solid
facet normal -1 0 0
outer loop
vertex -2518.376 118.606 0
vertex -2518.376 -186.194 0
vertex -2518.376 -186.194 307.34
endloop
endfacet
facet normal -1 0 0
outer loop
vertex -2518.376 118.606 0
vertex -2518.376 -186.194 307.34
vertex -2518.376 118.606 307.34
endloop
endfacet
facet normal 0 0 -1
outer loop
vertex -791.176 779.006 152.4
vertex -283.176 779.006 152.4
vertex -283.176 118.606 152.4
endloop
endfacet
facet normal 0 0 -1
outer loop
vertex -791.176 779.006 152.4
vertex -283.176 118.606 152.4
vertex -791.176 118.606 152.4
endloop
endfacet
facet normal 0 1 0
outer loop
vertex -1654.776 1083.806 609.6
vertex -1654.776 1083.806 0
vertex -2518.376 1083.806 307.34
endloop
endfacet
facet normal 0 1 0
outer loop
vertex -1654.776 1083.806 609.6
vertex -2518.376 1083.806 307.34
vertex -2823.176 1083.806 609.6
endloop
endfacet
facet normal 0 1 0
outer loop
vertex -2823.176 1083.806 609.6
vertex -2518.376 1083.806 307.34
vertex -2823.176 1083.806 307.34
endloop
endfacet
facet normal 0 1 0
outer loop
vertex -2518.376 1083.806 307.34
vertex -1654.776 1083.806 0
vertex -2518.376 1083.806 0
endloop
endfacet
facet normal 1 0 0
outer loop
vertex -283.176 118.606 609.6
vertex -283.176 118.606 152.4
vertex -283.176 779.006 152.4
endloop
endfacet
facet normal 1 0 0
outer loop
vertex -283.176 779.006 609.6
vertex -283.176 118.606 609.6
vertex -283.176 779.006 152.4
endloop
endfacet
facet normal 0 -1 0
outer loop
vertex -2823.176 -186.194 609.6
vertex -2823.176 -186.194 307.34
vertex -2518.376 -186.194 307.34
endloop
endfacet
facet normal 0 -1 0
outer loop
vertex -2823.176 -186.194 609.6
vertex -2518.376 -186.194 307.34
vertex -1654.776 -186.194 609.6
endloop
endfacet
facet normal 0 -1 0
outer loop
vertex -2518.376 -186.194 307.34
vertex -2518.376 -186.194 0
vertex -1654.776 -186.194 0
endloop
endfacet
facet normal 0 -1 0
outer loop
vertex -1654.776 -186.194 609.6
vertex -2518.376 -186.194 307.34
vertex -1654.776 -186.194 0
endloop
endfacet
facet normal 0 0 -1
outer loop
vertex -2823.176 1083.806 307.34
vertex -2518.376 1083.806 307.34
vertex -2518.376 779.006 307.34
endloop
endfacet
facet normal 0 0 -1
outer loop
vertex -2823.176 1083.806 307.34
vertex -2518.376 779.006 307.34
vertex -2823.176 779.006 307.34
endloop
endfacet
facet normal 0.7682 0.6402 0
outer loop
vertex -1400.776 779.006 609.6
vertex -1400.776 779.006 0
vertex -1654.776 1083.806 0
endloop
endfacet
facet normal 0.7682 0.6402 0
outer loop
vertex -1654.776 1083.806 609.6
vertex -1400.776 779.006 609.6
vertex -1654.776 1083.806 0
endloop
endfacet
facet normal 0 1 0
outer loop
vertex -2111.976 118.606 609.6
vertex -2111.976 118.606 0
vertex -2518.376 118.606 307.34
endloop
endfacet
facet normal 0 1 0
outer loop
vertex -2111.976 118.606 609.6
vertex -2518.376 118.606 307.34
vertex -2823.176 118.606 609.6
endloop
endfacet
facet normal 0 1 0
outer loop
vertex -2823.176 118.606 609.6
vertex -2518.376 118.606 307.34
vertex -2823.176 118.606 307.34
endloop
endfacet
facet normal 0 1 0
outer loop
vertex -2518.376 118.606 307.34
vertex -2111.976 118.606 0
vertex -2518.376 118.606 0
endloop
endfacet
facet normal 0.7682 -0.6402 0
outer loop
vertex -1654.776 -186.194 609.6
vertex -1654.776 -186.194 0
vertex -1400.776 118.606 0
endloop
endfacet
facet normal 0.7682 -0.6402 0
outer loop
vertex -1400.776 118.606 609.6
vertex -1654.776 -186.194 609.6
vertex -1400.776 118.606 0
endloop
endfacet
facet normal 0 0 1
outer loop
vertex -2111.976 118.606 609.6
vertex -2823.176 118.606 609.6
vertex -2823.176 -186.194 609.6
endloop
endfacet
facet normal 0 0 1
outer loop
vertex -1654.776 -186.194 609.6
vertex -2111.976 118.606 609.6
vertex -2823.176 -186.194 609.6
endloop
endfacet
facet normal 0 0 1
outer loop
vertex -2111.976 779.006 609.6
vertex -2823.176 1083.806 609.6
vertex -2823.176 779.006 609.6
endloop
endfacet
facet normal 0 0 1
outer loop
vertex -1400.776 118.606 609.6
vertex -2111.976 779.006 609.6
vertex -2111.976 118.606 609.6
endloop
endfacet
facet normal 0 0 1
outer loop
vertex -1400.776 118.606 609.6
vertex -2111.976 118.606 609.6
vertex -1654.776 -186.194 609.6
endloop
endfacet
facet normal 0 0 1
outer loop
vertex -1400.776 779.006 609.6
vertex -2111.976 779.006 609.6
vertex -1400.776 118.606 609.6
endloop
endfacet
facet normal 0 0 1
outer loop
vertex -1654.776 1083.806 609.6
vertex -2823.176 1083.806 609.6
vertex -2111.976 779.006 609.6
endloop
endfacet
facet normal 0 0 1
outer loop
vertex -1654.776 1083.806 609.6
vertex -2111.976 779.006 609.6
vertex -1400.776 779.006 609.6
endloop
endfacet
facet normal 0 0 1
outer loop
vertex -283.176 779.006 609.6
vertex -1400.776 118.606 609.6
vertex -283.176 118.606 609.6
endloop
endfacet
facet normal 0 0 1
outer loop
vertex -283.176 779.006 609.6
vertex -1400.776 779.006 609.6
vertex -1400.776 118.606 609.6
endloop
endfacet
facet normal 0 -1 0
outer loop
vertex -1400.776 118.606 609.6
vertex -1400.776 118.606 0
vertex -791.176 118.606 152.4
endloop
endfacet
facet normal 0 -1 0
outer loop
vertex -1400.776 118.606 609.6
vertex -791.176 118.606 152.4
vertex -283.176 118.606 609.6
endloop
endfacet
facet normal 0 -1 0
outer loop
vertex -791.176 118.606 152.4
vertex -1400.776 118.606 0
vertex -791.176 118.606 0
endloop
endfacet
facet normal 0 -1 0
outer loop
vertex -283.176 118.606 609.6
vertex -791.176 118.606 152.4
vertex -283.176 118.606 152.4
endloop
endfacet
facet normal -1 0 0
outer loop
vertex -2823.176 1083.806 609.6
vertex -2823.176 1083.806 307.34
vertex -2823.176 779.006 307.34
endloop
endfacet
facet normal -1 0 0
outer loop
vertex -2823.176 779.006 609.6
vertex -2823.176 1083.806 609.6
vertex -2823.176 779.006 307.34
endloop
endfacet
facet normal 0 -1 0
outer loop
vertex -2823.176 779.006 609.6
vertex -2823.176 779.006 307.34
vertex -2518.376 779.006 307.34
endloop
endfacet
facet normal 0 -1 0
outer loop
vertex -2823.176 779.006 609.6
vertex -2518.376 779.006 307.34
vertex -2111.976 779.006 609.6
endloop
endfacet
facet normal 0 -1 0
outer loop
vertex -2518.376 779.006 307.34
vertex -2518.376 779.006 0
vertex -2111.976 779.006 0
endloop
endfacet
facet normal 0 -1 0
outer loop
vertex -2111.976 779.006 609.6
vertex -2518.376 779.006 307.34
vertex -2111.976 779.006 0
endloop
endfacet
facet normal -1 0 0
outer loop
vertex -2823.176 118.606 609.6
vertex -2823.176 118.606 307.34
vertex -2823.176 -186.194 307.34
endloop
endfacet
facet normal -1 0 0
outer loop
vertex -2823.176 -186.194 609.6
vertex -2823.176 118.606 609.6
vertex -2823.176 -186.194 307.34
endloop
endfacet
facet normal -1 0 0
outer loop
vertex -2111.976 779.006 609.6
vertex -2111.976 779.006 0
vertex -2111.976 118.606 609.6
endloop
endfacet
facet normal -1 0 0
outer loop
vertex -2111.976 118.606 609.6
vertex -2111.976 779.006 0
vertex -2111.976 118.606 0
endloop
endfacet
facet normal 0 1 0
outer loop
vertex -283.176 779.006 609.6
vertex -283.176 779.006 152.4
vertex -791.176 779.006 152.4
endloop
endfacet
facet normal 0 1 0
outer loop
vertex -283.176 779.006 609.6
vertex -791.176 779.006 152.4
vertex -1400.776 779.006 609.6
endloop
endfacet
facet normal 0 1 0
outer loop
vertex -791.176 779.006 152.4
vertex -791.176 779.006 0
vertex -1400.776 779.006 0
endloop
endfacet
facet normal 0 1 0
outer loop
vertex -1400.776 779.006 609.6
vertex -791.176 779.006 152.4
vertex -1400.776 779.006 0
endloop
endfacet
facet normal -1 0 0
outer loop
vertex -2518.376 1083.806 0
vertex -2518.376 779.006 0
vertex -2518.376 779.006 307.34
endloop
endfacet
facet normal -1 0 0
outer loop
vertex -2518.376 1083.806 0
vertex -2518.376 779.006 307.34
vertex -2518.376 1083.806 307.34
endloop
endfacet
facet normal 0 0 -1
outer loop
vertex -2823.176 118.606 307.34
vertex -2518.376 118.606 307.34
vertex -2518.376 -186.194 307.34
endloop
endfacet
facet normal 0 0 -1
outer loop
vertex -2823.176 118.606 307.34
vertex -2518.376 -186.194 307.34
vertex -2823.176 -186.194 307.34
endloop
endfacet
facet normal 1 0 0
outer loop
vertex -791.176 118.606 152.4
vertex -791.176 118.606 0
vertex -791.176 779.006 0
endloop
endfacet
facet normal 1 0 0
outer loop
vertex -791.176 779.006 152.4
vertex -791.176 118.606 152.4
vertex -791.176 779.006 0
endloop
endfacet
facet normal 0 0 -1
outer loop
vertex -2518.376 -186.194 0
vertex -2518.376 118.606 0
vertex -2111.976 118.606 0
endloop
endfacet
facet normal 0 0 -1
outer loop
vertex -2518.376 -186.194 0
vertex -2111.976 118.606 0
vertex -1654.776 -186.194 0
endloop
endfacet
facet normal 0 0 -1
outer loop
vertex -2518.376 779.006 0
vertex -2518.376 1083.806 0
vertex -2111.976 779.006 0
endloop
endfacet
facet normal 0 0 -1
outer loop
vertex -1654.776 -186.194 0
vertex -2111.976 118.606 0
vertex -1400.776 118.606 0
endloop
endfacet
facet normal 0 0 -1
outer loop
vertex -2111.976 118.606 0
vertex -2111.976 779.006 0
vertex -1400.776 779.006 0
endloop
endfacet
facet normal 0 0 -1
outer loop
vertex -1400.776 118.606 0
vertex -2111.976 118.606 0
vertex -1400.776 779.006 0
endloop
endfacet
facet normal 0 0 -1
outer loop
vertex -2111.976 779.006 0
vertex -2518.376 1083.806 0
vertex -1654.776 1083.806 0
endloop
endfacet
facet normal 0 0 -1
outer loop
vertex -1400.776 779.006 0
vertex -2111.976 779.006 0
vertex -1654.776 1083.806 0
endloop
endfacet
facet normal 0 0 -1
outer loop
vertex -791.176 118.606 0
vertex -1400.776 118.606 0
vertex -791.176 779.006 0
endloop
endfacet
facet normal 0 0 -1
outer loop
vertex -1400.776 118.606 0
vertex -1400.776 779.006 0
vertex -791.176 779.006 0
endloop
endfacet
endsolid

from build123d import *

# Parameters (mm, degrees)
Y_KSEKLIK_EKSTR_ZYON3_DEPTH = 609.6
IZIM2_W                     = 508
IZIM2_H                     = 660.4
KES_EKSTR_ZYON1_DEPTH       = 152.4
IZIM3_W                     = 304.8
IZIM3_H                     = 304.8
KES_EKSTR_ZYON2_DEPTH       = 307.34


with BuildPart() as part:
    # Çizim1 → Yükseklik-Ekstrüzyon3 (new body)
    with BuildSketch(Plane.XY):
        Polygon((-283.176149051, 779.0060667), (-1400.776149051, 779.0060667), (-1654.776149051, 1083.8060667), (-2823.176149051, 1083.8060667), (-2823.176149051, 779.0060667), (-2111.976149051, 779.0060667), (-2111.976149051, 118.6060667), (-2823.176149051, 118.6060667), (-2823.176149051, -186.1939333), (-1654.776149051, -186.1939333), (-1400.776149051, 118.6060667), (-283.176149051, 118.6060667), align=None)
    extrude(amount=Y_KSEKLIK_EKSTR_ZYON3_DEPTH)

    # Çizim2 → Kes-Ekstrüzyon1 (cut)
    with BuildSketch(Plane(origin=(0, 0, 0), x_dir=(-1, 0, 0), z_dir=(0, 0, -1))):
        with Locations((537.176149051, 448.8060667)):
            Rectangle(IZIM2_W, IZIM2_H)
    extrude(amount=-KES_EKSTR_ZYON1_DEPTH, mode=Mode.SUBTRACT)

    # Çizim3 → Kes-Ekstrüzyon2 (cut)
    with BuildSketch(Plane(origin=(0, 0, 0), x_dir=(-1, 0, 0), z_dir=(0, 0, -1))):
        with Locations((2670.776149051, -33.7939333)):
            Rectangle(IZIM3_W, IZIM3_H)
        with Locations((2670.776149051, 931.4060667)):
            Rectangle(IZIM3_W, IZIM3_H)
    extrude(amount=-KES_EKSTR_ZYON2_DEPTH, mode=Mode.SUBTRACT)


solid = part.part
